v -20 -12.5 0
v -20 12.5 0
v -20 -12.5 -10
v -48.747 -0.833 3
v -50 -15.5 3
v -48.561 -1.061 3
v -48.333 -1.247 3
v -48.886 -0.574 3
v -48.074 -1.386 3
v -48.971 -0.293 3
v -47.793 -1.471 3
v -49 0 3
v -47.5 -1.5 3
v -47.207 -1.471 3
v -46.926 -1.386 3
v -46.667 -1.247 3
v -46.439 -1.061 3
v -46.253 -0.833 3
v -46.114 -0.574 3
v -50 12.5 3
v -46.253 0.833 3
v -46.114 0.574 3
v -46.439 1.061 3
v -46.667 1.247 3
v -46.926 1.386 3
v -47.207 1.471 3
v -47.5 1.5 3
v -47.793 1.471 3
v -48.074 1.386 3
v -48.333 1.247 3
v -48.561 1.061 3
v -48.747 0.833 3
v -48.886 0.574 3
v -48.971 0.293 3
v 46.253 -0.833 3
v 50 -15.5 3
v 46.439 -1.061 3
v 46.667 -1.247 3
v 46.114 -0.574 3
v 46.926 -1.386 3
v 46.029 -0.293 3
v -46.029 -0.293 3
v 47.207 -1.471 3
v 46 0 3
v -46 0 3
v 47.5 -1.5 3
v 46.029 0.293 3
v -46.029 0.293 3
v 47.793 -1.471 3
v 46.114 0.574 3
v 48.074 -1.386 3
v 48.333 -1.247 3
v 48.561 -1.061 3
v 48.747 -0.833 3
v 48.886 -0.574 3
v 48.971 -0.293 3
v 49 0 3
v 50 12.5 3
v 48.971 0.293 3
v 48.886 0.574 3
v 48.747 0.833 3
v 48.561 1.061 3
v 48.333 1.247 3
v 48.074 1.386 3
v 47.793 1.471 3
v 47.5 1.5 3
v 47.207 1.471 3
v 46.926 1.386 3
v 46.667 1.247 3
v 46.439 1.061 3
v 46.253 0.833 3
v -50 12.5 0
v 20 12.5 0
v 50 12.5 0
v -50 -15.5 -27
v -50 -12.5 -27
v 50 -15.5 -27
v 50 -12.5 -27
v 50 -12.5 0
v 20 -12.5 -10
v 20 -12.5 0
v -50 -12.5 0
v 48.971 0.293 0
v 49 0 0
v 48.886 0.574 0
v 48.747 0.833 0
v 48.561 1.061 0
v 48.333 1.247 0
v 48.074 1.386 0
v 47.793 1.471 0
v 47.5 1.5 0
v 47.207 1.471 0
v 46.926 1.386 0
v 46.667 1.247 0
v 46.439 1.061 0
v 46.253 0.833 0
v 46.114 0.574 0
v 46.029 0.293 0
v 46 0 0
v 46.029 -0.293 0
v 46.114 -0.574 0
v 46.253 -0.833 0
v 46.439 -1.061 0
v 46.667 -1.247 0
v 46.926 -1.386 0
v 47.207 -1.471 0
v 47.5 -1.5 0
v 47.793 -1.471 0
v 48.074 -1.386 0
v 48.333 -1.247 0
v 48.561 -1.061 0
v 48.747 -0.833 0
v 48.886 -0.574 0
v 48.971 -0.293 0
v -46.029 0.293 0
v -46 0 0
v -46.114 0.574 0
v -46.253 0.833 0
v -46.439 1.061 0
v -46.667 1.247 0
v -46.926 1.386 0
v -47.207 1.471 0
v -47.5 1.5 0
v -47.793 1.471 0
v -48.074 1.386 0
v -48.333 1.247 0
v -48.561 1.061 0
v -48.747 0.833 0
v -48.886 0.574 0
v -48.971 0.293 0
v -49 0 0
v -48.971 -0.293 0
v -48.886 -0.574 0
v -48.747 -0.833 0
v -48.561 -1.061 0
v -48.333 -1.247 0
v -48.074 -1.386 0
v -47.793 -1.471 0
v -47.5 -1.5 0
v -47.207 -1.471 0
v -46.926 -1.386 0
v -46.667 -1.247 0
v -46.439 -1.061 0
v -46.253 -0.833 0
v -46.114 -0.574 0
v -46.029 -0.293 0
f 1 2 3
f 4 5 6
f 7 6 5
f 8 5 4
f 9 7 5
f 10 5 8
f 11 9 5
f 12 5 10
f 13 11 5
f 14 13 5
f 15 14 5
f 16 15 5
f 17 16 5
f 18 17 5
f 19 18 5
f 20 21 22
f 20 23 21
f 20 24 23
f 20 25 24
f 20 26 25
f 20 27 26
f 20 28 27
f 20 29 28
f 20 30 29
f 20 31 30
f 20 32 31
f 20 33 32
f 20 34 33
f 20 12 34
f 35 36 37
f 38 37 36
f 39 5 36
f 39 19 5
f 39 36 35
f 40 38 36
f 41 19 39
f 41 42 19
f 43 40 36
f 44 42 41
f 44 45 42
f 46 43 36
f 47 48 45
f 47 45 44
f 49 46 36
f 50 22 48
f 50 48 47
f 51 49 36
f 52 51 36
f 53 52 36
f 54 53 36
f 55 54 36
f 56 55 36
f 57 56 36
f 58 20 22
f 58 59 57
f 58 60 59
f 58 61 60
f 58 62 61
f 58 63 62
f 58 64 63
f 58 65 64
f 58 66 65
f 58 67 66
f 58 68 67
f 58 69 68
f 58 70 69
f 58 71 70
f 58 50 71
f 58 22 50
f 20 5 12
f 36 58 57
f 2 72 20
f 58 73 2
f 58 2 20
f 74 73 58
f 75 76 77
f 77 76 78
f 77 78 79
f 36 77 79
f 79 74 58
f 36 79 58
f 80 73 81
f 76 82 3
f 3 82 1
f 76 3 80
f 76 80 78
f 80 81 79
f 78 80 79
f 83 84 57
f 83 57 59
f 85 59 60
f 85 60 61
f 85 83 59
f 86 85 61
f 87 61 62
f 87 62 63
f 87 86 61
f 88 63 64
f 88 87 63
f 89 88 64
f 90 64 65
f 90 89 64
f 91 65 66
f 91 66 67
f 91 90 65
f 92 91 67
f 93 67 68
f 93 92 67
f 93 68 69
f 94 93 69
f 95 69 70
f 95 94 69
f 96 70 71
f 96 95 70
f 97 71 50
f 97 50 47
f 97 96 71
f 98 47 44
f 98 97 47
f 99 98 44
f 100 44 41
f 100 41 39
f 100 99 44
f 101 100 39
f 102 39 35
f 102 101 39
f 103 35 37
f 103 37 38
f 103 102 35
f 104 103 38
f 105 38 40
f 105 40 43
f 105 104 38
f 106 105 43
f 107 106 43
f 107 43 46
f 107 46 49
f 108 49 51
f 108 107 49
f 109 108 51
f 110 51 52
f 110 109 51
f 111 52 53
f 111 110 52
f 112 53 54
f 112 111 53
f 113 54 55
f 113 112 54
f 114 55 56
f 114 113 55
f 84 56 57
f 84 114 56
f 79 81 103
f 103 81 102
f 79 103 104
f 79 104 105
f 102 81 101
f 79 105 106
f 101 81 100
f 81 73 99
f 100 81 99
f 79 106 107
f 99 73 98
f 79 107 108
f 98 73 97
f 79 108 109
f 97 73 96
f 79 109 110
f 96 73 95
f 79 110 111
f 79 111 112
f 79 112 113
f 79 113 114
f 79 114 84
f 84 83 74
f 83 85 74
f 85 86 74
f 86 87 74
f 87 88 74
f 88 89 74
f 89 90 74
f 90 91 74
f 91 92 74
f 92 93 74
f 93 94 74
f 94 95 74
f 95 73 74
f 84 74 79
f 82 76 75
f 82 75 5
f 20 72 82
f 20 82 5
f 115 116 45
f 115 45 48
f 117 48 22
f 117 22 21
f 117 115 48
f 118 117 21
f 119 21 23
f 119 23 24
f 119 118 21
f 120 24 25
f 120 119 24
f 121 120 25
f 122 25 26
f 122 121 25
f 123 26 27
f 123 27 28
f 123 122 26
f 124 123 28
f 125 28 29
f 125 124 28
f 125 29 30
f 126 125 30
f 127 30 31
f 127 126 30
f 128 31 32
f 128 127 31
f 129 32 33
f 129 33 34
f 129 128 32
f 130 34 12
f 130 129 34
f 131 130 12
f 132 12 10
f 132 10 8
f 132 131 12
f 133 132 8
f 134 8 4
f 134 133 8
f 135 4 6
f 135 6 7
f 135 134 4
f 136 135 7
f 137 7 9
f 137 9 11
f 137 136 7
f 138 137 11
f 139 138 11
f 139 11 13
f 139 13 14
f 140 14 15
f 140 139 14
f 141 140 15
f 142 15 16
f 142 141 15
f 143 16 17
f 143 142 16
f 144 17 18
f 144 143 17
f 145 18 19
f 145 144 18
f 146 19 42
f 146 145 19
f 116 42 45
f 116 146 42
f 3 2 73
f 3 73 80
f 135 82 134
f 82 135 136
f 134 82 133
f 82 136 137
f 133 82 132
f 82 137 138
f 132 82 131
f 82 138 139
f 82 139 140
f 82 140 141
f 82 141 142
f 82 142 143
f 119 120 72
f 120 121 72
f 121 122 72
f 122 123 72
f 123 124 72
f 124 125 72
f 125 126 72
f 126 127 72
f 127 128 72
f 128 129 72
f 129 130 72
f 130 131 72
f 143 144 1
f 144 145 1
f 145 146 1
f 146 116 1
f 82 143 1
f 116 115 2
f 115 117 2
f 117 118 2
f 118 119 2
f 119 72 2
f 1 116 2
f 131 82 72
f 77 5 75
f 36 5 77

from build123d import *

# Parameters (mm, degrees)
SKETCH1_W           = 100
SKETCH1_H           = 25
SKETCH1_R           = 1.5
BOSS_EXTRUDE1_DEPTH = 3
SKETCH2_W           = 100
SKETCH2_H           = 30
BOSS_EXTRUDE2_DEPTH = 3
RIB1_REACH          = 60.9
SKETCH3_WALL_W      = 146.72650315
SKETCH3_WALL_H      = 40


with BuildPart() as part:
    # Sketch1 → Boss-Extrude1 (new body)
    with BuildSketch(Plane.XY):
        Rectangle(SKETCH1_W, SKETCH1_H)
        with Locations((-47.5, 0)):
            Circle(SKETCH1_R, mode=Mode.SUBTRACT)
        with Locations((47.5, 0)):
            Circle(SKETCH1_R, mode=Mode.SUBTRACT)
    extrude(amount=BOSS_EXTRUDE1_DEPTH)

    # Sketch2 → Boss-Extrude2 (add)
    with BuildSketch(Plane.XZ.offset(12.5)):
        with Locations((0, -12)):
            Rectangle(SKETCH2_W, SKETCH2_H)
    extrude(amount=BOSS_EXTRUDE2_DEPTH)

    # Sketch3 wall → Rib1 (add, up to next)
    with BuildSketch(Plane(origin=(0, 0, -5), x_dir=(0, -0.928476690885, -0.371390676354), z_dir=(0, 0.371390676354, -0.928476690885)), mode=Mode.PRIVATE) as rib1_sk1:
        Rectangle(SKETCH3_WALL_W, SKETCH3_WALL_H)
    rib1_tool1 = extrude(rib1_sk1.sketch, amount=-RIB1_REACH, mode=Mode.PRIVATE) - part.part
    add(rib1_tool1.solids().sort_by_distance((0, 0, -5))[0])


solid = part.part
